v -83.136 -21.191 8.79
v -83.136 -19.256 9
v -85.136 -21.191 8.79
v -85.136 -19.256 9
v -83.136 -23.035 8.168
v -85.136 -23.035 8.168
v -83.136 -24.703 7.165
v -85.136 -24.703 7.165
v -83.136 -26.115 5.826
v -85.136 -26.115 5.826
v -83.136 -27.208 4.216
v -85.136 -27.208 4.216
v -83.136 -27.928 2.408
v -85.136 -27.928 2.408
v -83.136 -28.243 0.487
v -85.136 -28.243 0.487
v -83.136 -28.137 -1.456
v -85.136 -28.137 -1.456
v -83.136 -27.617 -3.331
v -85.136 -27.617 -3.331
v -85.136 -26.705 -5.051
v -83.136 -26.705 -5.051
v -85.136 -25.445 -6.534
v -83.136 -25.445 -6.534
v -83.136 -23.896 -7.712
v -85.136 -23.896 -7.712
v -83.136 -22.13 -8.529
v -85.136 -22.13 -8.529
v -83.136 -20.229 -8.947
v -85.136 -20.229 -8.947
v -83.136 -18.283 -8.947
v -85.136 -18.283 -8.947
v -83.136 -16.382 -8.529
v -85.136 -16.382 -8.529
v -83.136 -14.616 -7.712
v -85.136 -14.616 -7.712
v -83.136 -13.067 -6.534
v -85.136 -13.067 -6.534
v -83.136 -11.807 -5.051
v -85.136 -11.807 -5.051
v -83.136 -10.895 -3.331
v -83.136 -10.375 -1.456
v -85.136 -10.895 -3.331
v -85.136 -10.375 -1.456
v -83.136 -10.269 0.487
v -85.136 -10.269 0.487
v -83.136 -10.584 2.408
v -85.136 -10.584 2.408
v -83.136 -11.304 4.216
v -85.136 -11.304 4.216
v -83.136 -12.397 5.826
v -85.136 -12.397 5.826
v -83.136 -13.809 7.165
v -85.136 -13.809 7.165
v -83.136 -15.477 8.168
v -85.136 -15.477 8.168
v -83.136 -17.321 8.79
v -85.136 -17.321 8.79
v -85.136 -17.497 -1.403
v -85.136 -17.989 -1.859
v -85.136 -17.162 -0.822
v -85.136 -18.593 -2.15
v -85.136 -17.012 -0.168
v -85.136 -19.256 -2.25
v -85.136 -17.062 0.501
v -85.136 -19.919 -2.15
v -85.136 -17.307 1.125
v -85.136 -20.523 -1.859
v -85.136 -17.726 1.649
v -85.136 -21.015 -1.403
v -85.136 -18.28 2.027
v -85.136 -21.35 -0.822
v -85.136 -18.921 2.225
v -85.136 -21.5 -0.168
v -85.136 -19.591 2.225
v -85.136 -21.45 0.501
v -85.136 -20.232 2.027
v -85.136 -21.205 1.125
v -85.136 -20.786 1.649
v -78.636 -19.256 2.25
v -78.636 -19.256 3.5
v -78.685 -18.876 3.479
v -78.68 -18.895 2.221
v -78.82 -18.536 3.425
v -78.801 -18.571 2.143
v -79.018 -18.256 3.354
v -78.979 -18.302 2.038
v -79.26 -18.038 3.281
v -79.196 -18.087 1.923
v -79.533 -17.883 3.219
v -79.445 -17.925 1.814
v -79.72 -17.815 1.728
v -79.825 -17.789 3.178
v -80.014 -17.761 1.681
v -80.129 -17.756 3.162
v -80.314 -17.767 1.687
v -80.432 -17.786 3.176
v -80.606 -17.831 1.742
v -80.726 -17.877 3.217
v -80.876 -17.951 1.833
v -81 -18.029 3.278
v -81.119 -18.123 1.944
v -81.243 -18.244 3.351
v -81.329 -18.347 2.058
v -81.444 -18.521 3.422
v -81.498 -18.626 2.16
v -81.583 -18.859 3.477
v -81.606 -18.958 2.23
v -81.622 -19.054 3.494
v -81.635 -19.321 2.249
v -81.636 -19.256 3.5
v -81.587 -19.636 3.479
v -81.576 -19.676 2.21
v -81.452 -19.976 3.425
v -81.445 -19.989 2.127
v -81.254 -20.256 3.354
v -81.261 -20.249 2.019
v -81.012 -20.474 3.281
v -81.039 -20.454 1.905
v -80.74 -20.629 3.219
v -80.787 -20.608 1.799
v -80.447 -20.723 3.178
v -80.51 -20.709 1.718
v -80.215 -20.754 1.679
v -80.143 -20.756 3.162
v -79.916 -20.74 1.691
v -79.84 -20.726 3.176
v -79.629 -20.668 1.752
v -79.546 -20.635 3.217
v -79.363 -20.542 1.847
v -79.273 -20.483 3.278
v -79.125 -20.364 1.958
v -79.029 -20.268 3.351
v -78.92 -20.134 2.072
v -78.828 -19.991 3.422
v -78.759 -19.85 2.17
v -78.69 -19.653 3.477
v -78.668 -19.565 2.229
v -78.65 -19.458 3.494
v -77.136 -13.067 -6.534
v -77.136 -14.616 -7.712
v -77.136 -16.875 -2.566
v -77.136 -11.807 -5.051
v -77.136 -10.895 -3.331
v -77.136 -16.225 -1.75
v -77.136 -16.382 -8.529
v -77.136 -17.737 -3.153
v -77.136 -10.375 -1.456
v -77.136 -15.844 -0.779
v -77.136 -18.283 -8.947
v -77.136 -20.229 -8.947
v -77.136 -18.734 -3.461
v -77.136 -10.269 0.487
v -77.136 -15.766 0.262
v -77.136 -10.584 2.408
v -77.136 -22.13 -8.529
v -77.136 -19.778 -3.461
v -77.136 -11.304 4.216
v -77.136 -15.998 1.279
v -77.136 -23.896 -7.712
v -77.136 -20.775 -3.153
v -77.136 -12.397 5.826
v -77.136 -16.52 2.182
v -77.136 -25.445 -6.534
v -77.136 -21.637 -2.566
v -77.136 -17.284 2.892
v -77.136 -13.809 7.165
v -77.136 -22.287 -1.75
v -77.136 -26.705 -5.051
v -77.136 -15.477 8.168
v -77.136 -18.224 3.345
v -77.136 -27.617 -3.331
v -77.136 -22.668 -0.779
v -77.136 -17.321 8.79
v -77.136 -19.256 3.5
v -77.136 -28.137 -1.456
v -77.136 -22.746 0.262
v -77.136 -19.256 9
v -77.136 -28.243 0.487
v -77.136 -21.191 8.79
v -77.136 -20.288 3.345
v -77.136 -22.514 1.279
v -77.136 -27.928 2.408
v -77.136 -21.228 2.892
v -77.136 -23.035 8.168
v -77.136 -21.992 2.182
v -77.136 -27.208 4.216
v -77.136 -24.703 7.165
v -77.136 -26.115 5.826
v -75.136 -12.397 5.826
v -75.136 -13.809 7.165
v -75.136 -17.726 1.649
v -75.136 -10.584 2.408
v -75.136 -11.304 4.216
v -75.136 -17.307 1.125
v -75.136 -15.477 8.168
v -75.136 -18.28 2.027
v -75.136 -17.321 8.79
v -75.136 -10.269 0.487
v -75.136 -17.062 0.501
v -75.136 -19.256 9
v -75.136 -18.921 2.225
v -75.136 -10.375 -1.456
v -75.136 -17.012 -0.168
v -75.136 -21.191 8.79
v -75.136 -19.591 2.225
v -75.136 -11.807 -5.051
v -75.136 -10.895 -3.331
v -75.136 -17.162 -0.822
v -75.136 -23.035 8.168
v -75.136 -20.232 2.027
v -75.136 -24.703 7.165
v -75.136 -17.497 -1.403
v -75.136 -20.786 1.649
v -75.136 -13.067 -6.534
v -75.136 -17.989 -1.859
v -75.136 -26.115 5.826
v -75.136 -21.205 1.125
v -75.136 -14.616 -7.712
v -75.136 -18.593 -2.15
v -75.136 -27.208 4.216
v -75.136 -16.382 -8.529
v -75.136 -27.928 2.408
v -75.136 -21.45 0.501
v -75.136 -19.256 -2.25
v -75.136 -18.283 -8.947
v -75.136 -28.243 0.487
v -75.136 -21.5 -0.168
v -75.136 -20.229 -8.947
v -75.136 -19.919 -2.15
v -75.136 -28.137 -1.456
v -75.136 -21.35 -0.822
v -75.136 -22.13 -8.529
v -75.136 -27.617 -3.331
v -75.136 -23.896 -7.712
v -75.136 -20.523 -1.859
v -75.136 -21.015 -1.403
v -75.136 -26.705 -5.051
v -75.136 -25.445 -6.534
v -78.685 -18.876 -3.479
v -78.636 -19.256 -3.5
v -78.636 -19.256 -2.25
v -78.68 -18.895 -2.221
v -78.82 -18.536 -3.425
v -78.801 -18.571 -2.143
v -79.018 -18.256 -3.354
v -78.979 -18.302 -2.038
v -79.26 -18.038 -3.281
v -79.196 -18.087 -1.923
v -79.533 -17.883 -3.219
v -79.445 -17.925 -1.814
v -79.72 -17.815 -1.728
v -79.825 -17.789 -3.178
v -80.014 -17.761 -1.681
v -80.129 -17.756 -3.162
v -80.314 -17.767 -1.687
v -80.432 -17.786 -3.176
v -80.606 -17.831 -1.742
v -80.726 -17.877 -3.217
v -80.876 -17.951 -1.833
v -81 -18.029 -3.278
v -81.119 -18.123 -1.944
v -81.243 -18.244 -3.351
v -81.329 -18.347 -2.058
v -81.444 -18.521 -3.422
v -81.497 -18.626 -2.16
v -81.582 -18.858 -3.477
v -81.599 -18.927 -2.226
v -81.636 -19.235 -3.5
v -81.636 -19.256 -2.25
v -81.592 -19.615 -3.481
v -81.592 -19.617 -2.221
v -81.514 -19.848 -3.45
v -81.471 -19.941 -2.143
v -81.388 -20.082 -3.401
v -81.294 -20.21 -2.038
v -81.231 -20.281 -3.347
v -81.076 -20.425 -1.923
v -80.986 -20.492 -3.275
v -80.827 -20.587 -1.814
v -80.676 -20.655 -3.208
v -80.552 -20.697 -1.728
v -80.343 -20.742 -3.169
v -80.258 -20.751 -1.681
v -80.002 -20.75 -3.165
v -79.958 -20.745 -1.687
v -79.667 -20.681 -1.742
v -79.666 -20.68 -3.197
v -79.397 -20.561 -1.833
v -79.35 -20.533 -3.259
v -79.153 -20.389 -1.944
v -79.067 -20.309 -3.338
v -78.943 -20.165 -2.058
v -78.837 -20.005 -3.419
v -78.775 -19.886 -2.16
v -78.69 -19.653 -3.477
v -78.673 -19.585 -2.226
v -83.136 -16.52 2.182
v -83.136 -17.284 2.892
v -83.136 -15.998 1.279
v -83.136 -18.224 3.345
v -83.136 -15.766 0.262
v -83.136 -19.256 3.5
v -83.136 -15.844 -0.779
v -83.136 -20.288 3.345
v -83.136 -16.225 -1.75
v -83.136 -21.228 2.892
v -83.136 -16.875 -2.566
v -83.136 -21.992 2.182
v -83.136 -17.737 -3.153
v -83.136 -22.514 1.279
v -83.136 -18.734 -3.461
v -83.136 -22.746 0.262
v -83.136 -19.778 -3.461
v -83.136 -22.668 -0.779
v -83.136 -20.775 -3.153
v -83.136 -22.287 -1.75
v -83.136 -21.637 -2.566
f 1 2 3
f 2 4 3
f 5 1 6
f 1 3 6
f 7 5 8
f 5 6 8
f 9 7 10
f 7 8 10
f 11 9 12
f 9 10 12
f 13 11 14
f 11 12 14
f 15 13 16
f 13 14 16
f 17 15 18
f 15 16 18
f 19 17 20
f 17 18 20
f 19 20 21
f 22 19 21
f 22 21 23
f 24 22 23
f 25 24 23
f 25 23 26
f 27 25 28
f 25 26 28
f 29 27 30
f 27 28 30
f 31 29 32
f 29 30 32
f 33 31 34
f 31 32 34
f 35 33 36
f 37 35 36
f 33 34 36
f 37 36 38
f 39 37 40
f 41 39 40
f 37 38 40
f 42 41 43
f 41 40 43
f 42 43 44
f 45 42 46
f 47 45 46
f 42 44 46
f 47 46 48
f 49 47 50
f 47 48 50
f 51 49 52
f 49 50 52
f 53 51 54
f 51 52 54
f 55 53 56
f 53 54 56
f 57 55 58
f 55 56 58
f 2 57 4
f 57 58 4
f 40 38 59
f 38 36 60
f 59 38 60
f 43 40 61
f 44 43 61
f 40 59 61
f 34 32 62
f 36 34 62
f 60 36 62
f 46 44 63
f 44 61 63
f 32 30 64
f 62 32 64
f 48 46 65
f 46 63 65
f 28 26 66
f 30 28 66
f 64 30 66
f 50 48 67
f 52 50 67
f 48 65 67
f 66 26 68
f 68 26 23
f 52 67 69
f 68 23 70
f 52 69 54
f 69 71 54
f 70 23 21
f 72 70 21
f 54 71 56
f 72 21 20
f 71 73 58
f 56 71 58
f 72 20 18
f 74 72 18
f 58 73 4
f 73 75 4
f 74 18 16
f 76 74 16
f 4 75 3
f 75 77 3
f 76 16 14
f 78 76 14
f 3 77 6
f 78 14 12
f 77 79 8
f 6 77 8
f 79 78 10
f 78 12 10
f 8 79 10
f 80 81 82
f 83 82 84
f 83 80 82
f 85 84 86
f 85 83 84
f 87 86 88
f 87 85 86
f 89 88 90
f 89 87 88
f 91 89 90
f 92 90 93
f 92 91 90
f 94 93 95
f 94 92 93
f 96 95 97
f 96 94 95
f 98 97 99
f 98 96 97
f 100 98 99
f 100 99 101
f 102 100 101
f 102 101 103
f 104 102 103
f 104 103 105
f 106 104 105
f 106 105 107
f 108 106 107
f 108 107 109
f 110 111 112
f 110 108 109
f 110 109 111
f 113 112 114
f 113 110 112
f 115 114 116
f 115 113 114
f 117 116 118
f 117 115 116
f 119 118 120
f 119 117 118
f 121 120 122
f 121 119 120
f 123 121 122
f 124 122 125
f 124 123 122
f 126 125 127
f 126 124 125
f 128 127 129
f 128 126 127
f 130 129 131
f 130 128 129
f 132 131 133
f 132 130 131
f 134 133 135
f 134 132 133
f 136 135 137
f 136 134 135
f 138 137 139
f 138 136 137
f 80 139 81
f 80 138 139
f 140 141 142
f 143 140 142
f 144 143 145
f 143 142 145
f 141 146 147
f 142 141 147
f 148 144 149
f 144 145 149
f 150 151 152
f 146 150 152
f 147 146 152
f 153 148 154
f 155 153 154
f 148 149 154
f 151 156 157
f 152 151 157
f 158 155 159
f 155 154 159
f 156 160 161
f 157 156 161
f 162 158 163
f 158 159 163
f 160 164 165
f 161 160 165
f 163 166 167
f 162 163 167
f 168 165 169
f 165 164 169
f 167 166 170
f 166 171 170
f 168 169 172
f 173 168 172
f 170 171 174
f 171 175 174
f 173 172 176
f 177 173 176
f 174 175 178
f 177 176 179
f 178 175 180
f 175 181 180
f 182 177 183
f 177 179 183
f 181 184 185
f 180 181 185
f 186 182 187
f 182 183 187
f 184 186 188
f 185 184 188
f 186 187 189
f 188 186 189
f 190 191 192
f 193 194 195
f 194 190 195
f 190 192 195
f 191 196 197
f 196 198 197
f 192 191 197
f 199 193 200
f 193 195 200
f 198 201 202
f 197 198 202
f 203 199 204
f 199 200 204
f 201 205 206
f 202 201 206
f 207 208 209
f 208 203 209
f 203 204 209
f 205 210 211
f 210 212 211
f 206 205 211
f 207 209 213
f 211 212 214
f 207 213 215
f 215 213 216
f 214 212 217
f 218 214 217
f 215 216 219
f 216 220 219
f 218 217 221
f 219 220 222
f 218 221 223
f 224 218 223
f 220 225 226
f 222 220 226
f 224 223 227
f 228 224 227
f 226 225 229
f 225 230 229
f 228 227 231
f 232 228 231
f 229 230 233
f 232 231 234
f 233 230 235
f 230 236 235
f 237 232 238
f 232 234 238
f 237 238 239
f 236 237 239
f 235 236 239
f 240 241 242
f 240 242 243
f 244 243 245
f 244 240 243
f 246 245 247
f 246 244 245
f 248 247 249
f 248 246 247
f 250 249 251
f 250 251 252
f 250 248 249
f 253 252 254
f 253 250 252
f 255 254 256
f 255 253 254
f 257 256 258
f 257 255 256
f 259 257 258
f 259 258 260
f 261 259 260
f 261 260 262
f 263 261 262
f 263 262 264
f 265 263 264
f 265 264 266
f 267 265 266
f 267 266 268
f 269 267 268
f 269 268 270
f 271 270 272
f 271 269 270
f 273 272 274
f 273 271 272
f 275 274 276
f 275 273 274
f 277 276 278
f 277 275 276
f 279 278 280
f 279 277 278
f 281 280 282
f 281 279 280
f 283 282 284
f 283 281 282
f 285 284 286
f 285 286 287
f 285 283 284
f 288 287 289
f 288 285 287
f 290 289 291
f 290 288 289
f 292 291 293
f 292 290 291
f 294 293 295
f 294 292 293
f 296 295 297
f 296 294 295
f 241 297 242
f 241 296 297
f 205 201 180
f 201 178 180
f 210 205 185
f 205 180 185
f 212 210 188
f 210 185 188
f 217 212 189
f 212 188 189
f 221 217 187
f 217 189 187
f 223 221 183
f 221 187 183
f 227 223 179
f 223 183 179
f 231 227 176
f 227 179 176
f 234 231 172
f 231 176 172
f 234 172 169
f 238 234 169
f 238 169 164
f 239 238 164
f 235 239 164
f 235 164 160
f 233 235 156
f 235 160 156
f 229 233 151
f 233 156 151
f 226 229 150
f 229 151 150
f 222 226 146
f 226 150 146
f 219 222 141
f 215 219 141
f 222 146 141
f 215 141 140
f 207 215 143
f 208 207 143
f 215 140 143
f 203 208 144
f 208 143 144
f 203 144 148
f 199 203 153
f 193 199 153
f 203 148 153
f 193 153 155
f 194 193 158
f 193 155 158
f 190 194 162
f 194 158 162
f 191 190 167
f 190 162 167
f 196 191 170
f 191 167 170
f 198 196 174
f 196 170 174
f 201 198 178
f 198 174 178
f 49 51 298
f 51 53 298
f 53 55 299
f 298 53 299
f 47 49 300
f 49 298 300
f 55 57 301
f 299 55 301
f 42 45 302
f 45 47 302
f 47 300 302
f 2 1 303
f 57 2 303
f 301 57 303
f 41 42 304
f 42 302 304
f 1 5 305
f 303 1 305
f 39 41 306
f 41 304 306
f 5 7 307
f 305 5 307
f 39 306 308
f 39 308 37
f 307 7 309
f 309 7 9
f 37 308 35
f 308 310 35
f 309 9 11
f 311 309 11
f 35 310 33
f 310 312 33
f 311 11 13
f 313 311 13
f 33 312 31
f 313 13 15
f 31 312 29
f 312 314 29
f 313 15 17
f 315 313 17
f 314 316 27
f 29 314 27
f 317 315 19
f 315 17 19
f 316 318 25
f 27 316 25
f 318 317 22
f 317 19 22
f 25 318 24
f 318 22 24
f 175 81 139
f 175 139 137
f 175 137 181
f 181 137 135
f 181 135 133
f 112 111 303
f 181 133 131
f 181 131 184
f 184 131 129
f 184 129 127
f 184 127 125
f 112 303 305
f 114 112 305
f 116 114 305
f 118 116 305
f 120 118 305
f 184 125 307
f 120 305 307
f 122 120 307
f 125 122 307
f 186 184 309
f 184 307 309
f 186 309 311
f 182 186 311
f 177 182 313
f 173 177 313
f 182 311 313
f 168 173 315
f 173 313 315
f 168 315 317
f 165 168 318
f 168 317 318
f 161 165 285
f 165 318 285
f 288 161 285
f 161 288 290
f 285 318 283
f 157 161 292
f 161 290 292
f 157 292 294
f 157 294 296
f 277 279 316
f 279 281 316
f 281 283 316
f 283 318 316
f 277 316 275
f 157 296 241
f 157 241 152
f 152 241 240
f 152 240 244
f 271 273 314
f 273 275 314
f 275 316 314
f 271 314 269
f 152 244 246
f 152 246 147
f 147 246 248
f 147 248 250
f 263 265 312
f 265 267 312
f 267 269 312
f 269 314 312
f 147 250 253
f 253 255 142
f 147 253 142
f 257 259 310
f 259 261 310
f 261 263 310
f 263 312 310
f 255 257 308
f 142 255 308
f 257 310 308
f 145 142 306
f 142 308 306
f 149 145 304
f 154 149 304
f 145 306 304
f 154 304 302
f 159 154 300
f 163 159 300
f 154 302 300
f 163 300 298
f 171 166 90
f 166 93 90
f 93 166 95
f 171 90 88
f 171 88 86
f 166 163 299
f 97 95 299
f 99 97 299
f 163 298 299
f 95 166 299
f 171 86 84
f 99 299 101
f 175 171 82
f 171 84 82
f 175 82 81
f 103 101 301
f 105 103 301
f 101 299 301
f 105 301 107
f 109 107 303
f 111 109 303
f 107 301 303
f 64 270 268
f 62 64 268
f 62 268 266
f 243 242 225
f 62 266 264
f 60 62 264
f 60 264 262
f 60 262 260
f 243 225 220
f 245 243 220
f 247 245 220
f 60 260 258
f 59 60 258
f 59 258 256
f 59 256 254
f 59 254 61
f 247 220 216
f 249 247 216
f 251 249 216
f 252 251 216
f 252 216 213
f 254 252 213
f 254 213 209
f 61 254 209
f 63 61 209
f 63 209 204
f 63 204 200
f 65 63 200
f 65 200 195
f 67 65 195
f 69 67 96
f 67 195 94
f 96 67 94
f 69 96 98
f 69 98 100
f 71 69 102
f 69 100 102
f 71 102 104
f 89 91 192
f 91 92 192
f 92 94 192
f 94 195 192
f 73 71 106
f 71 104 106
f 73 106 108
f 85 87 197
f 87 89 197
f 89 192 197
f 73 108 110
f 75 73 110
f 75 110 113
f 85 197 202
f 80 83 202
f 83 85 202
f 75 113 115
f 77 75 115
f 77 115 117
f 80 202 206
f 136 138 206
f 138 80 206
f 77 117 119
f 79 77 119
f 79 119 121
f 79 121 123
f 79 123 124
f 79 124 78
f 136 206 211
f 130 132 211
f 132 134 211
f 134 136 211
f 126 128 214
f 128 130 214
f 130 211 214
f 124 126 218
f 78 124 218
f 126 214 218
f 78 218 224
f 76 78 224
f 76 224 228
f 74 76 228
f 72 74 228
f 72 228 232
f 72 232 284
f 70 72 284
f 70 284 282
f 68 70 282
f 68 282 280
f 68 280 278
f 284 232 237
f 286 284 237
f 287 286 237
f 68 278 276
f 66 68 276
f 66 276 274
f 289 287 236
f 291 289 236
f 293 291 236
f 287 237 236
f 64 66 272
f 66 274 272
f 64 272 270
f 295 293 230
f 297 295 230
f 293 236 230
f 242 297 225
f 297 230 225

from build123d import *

# Parameters (mm, degrees)
SKETCH2_R               = 2.25
CUT_EXTRUDE1_DEPTH      = 32.295394302
CUT_EXTRUDE2_DEPTH      = 91.152948551
CUT_EXTRUDE2_DEPTH_BACK = 91.152948551
SKETCH5_R               = 1.5


with BuildPart() as part:
    # Sketch1 → Revolve2 (revolve)
    with BuildSketch(Plane.XY, mode=Mode.PRIVATE) as revolve2_sk:
        Polygon((-85.136081821, -10.256002982), (-85.136081821, -19.256002982), (-75.136081821, -19.256002982), (-75.136081821, -10.256002982), (-77.136081821, -10.256002982), (-77.136081821, -15.756002982), (-83.136081821, -15.756002982), (-83.136081821, -10.256002982), align=None)
    revolve(revolve2_sk.sketch.rotate(Axis((-85.136081821, -19.256002982, 0), (1, 0, 0)), 90), axis=Axis((-85.136081821, -19.256002982, 0), (1, 0, 0)))

    # Sketch2 → Cut-Extrude1 (cut, through all)
    with BuildSketch(Plane(origin=(-75.136081821, 0, 0), x_dir=(0, 0, -1), z_dir=(1, 0, 0))):
        with Locations((0, -19.256002982)):
            Circle(SKETCH2_R)
    extrude(amount=-CUT_EXTRUDE1_DEPTH, mode=Mode.SUBTRACT)

    # Sketch5 → Cut-Extrude2 (cut, two sides: drawn at the far end of the back side and taken through both)
    with BuildSketch(Plane.XY.offset(-CUT_EXTRUDE2_DEPTH_BACK)):
        with Locations((-80.136081821, -19.256002982)):
            Circle(SKETCH5_R)
    extrude(amount=CUT_EXTRUDE2_DEPTH + CUT_EXTRUDE2_DEPTH_BACK, mode=Mode.SUBTRACT)


solid = part.part
